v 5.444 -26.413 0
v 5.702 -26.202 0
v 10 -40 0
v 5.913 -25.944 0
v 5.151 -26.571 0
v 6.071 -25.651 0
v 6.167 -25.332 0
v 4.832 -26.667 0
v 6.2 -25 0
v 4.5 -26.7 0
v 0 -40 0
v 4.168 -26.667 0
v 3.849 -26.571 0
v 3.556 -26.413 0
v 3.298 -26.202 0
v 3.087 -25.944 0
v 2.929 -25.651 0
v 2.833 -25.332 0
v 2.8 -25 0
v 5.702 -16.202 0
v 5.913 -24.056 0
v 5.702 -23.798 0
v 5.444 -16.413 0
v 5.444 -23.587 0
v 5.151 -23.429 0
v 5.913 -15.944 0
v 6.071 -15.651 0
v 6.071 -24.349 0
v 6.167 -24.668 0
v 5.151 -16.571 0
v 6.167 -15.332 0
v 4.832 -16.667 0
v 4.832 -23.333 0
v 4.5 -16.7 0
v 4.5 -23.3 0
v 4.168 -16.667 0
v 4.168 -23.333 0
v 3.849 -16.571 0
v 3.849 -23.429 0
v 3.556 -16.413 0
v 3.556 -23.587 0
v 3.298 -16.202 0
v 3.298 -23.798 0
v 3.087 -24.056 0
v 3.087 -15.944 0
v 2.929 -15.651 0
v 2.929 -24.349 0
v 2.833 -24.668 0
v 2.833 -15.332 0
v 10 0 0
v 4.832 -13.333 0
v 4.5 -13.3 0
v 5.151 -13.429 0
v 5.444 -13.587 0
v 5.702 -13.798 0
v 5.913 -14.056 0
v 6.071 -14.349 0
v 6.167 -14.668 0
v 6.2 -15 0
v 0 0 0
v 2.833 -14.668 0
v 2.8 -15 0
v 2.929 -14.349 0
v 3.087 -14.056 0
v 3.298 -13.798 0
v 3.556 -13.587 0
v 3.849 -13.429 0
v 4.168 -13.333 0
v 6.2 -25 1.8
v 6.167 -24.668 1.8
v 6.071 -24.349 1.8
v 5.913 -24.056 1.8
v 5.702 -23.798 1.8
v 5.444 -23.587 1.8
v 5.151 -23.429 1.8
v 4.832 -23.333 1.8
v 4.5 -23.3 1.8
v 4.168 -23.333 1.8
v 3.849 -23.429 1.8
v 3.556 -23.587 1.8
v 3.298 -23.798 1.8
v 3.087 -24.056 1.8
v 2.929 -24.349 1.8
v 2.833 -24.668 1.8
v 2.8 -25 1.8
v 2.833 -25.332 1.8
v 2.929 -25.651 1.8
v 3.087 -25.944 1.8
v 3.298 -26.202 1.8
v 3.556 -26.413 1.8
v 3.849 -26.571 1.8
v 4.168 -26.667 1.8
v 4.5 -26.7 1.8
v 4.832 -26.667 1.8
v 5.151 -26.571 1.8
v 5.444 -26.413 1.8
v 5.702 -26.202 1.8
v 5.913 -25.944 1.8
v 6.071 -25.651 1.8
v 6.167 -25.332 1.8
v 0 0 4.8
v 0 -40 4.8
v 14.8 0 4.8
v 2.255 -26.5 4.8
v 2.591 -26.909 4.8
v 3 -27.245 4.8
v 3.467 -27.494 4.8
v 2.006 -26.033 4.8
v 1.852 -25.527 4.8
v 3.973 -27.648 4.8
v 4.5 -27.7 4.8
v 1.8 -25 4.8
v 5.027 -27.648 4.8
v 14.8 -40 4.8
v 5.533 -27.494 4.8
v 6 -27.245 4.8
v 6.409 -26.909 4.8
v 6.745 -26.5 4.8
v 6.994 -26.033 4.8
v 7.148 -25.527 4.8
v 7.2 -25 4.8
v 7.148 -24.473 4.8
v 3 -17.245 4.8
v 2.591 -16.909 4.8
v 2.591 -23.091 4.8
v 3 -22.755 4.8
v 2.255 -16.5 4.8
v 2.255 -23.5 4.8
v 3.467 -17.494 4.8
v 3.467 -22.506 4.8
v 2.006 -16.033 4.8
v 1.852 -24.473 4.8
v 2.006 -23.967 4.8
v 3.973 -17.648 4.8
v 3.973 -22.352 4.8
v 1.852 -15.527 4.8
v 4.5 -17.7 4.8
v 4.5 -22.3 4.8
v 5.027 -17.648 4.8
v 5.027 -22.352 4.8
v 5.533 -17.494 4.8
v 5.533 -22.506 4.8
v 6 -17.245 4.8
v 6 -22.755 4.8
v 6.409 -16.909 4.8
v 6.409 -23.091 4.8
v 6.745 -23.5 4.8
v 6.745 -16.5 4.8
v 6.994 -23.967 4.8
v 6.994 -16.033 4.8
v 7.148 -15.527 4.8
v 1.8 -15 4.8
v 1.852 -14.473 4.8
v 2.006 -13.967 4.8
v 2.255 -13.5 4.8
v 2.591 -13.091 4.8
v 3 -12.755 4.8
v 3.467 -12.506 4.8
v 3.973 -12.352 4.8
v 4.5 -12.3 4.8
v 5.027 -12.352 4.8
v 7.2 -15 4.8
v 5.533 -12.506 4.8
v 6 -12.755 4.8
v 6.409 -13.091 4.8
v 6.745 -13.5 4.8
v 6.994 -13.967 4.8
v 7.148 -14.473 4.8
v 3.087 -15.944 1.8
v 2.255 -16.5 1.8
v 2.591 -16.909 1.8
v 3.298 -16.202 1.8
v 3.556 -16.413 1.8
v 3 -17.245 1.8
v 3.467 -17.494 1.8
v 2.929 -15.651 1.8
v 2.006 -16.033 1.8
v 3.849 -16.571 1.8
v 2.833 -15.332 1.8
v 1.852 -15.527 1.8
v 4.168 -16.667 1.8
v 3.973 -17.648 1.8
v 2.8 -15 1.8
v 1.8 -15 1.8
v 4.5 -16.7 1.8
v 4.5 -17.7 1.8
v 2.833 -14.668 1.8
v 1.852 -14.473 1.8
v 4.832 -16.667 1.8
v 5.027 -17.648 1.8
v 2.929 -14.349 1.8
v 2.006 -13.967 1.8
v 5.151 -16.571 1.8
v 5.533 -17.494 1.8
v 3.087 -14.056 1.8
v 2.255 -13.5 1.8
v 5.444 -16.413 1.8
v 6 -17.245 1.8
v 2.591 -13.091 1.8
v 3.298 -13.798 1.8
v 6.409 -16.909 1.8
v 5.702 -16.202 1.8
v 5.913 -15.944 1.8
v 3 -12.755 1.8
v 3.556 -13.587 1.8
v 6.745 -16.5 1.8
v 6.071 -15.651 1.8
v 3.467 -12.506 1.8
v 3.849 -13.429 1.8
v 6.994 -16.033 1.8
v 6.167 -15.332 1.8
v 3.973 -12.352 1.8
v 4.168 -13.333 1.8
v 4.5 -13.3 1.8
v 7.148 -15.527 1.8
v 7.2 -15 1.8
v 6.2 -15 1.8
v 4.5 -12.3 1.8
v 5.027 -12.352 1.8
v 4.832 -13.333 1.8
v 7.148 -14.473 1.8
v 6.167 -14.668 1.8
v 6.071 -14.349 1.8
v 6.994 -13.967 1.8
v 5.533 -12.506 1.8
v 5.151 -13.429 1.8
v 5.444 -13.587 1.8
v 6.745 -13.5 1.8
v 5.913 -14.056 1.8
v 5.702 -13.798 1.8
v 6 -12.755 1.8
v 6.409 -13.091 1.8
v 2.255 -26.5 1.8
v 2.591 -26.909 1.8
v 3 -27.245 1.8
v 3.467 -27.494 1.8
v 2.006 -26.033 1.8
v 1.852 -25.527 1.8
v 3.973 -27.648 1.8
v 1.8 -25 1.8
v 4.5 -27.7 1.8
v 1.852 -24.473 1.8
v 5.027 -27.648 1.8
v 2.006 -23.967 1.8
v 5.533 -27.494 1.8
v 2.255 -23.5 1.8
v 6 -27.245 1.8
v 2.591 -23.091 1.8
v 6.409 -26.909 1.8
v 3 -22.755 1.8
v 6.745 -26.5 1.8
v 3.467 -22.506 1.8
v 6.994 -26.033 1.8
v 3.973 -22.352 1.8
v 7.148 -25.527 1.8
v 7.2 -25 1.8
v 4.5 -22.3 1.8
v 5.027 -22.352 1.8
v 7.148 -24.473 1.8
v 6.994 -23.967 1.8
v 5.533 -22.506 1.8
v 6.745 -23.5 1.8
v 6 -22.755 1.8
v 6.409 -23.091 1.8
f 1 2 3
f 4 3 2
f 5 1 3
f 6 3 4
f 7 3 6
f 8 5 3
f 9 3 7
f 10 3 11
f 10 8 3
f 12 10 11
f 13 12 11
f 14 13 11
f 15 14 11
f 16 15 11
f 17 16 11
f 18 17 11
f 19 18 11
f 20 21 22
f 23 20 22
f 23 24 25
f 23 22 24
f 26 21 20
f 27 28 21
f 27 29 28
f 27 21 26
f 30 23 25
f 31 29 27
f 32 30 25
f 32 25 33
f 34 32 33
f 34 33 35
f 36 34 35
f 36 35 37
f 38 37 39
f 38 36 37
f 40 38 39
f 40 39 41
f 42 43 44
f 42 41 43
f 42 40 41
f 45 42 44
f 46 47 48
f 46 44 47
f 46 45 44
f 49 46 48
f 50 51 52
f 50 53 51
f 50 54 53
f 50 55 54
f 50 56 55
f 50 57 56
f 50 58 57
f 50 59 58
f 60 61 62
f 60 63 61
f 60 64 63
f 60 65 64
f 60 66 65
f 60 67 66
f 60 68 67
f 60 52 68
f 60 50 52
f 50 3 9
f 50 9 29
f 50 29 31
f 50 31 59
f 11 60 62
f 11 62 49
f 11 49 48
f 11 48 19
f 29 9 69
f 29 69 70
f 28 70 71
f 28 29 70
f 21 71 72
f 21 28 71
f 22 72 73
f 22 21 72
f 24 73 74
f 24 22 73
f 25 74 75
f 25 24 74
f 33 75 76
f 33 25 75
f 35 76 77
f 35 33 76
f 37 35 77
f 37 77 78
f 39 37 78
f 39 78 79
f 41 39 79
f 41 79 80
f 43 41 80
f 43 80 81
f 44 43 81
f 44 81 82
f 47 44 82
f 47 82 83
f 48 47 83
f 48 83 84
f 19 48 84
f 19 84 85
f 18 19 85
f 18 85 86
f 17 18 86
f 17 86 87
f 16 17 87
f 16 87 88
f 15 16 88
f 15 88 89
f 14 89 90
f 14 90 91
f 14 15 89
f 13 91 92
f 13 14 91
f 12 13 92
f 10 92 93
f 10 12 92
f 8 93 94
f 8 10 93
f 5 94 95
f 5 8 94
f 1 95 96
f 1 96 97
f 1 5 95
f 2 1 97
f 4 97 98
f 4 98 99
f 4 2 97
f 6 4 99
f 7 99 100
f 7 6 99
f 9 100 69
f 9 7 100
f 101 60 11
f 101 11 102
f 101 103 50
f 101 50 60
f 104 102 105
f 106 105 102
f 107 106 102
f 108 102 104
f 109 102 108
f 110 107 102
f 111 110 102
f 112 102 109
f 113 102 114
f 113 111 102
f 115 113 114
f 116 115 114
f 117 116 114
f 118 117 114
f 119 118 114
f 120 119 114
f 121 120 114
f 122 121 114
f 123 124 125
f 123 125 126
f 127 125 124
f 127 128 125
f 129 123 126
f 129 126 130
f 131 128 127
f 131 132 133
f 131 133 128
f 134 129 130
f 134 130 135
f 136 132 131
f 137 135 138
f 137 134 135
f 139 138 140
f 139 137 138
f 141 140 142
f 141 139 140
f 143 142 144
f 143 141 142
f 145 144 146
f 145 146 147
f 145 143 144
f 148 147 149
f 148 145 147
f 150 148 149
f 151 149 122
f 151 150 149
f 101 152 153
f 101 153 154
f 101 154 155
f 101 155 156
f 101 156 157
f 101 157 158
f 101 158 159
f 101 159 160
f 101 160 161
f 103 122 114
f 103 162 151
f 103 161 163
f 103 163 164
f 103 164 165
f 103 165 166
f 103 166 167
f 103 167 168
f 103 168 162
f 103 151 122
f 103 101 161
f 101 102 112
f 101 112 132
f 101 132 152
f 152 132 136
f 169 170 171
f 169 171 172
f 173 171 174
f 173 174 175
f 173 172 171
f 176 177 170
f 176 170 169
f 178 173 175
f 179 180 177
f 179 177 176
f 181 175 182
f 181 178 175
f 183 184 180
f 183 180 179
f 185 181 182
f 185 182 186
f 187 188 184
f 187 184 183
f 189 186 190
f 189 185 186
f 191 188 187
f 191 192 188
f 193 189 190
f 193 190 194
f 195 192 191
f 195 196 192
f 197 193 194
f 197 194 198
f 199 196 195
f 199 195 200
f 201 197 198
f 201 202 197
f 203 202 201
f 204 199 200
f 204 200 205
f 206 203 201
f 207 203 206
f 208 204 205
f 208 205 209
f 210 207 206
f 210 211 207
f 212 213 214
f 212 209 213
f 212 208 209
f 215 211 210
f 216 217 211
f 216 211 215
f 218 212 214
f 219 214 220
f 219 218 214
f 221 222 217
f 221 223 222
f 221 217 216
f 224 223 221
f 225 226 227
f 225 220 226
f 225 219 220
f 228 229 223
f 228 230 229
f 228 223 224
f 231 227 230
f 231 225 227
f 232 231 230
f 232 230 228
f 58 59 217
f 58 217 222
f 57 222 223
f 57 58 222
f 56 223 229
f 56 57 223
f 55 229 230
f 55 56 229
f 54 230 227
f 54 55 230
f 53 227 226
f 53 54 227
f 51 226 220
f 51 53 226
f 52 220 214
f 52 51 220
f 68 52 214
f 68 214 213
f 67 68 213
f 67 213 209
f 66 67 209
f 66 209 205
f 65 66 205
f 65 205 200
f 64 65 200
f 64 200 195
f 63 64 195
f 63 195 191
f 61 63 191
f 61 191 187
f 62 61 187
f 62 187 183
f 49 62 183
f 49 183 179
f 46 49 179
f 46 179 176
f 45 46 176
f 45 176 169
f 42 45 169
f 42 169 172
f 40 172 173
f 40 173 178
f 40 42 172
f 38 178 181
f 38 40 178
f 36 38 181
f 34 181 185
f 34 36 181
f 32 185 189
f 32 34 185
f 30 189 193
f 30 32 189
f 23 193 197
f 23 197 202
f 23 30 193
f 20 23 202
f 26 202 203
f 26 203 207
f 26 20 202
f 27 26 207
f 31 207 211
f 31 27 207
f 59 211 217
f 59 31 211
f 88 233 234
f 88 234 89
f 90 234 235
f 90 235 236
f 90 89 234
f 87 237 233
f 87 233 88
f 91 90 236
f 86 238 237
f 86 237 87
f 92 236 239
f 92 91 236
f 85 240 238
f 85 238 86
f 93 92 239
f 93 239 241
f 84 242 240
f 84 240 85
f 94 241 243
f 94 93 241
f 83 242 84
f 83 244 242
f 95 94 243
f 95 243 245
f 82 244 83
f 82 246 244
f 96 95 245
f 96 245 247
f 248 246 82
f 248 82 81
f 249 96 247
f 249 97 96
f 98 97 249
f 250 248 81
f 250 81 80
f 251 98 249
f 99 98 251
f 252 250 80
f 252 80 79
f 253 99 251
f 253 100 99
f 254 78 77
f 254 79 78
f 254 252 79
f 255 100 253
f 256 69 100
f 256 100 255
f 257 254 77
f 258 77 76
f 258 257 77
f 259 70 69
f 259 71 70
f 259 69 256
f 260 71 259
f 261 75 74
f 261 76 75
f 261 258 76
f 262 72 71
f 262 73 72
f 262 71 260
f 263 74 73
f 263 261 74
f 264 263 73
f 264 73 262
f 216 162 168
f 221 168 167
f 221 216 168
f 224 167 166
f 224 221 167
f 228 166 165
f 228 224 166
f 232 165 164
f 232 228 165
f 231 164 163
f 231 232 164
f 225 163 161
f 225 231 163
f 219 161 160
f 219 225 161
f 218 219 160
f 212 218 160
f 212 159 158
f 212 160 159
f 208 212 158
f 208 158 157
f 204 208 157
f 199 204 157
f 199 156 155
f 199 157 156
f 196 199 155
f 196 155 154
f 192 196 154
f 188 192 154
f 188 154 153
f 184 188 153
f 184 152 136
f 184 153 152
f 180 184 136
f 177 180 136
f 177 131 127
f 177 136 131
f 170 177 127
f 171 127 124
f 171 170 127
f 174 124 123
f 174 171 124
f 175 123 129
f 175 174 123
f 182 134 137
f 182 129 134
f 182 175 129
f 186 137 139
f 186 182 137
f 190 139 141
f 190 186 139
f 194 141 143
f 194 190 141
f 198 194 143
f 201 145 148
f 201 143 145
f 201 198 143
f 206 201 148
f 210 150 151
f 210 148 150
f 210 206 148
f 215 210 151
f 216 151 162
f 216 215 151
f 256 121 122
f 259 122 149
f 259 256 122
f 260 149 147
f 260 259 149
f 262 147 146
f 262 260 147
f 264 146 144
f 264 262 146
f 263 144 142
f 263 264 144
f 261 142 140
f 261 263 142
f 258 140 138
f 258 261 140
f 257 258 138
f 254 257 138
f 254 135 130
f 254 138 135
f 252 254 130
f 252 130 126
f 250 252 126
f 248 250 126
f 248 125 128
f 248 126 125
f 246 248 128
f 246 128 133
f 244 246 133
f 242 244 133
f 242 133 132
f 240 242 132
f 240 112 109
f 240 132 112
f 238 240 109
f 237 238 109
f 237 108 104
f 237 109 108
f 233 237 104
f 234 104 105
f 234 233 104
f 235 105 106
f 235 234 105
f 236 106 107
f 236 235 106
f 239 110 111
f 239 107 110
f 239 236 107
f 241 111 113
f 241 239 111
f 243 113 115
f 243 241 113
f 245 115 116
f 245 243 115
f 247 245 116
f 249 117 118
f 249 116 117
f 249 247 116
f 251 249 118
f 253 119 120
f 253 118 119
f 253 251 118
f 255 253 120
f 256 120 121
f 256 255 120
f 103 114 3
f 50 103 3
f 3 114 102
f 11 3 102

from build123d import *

# Parameters (mm, degrees)
CYLINDER1020_R     = 2.7
CYLINDER1020_DEPTH = 10
CYLINDER1018_R     = 1.7
CYLINDER1018_DEPTH = 10
PAD020_DEPTH       = 40


with BuildPart() as cylinder1015:
    # Cylinder1020 → Cylinder1020 (new body)
    with BuildSketch(Plane.XY.offset(10)):
        Circle(CYLINDER1020_R)
    extrude(amount=CYLINDER1020_DEPTH)


with BuildPart() as m3bolthead:
    # Cylinder1018 → Cylinder1018 (new body)
    with BuildSketch(Plane.XY):
        Circle(CYLINDER1018_R)
    extrude(amount=CYLINDER1018_DEPTH)

    # Fusion024: union Cylinder1015
    add(cylinder1015.part)


with BuildPart() as clone_of_m3bolthead002:
    # Clone034 base: copy of M3BoltHead
    add(m3bolthead.part)


with BuildPart() as clone_of_m3bolthead002_1:
    # Clone034 placement: moved
    add(clone_of_m3bolthead002.part.moved(Location((4.5, -15, -8.2))))


with BuildPart() as fusion041:
    # Clone033 base: copy of M3BoltHead
    add(m3bolthead.part)


with BuildPart() as fusion041_1:
    # Clone033 placement: moved
    add(fusion041.part.moved(Location((4.5, -25, -8.2))))

    # Fusion041: union Clone of M3BoltHead002
    add(clone_of_m3bolthead002_1.part)


with BuildPart() as clone_of_botfix:
    # Sketch021 → Pad020 (new body)
    with BuildSketch(Plane.XZ):
        Polygon((0, 0), (0, 4.8), (14.8, 4.8), (10, 0), align=None)
    extrude(amount=PAD020_DEPTH)

    # Cut050: cut Fusion041
    add(fusion041_1.part, mode=Mode.SUBTRACT)


solid = clone_of_botfix.part
